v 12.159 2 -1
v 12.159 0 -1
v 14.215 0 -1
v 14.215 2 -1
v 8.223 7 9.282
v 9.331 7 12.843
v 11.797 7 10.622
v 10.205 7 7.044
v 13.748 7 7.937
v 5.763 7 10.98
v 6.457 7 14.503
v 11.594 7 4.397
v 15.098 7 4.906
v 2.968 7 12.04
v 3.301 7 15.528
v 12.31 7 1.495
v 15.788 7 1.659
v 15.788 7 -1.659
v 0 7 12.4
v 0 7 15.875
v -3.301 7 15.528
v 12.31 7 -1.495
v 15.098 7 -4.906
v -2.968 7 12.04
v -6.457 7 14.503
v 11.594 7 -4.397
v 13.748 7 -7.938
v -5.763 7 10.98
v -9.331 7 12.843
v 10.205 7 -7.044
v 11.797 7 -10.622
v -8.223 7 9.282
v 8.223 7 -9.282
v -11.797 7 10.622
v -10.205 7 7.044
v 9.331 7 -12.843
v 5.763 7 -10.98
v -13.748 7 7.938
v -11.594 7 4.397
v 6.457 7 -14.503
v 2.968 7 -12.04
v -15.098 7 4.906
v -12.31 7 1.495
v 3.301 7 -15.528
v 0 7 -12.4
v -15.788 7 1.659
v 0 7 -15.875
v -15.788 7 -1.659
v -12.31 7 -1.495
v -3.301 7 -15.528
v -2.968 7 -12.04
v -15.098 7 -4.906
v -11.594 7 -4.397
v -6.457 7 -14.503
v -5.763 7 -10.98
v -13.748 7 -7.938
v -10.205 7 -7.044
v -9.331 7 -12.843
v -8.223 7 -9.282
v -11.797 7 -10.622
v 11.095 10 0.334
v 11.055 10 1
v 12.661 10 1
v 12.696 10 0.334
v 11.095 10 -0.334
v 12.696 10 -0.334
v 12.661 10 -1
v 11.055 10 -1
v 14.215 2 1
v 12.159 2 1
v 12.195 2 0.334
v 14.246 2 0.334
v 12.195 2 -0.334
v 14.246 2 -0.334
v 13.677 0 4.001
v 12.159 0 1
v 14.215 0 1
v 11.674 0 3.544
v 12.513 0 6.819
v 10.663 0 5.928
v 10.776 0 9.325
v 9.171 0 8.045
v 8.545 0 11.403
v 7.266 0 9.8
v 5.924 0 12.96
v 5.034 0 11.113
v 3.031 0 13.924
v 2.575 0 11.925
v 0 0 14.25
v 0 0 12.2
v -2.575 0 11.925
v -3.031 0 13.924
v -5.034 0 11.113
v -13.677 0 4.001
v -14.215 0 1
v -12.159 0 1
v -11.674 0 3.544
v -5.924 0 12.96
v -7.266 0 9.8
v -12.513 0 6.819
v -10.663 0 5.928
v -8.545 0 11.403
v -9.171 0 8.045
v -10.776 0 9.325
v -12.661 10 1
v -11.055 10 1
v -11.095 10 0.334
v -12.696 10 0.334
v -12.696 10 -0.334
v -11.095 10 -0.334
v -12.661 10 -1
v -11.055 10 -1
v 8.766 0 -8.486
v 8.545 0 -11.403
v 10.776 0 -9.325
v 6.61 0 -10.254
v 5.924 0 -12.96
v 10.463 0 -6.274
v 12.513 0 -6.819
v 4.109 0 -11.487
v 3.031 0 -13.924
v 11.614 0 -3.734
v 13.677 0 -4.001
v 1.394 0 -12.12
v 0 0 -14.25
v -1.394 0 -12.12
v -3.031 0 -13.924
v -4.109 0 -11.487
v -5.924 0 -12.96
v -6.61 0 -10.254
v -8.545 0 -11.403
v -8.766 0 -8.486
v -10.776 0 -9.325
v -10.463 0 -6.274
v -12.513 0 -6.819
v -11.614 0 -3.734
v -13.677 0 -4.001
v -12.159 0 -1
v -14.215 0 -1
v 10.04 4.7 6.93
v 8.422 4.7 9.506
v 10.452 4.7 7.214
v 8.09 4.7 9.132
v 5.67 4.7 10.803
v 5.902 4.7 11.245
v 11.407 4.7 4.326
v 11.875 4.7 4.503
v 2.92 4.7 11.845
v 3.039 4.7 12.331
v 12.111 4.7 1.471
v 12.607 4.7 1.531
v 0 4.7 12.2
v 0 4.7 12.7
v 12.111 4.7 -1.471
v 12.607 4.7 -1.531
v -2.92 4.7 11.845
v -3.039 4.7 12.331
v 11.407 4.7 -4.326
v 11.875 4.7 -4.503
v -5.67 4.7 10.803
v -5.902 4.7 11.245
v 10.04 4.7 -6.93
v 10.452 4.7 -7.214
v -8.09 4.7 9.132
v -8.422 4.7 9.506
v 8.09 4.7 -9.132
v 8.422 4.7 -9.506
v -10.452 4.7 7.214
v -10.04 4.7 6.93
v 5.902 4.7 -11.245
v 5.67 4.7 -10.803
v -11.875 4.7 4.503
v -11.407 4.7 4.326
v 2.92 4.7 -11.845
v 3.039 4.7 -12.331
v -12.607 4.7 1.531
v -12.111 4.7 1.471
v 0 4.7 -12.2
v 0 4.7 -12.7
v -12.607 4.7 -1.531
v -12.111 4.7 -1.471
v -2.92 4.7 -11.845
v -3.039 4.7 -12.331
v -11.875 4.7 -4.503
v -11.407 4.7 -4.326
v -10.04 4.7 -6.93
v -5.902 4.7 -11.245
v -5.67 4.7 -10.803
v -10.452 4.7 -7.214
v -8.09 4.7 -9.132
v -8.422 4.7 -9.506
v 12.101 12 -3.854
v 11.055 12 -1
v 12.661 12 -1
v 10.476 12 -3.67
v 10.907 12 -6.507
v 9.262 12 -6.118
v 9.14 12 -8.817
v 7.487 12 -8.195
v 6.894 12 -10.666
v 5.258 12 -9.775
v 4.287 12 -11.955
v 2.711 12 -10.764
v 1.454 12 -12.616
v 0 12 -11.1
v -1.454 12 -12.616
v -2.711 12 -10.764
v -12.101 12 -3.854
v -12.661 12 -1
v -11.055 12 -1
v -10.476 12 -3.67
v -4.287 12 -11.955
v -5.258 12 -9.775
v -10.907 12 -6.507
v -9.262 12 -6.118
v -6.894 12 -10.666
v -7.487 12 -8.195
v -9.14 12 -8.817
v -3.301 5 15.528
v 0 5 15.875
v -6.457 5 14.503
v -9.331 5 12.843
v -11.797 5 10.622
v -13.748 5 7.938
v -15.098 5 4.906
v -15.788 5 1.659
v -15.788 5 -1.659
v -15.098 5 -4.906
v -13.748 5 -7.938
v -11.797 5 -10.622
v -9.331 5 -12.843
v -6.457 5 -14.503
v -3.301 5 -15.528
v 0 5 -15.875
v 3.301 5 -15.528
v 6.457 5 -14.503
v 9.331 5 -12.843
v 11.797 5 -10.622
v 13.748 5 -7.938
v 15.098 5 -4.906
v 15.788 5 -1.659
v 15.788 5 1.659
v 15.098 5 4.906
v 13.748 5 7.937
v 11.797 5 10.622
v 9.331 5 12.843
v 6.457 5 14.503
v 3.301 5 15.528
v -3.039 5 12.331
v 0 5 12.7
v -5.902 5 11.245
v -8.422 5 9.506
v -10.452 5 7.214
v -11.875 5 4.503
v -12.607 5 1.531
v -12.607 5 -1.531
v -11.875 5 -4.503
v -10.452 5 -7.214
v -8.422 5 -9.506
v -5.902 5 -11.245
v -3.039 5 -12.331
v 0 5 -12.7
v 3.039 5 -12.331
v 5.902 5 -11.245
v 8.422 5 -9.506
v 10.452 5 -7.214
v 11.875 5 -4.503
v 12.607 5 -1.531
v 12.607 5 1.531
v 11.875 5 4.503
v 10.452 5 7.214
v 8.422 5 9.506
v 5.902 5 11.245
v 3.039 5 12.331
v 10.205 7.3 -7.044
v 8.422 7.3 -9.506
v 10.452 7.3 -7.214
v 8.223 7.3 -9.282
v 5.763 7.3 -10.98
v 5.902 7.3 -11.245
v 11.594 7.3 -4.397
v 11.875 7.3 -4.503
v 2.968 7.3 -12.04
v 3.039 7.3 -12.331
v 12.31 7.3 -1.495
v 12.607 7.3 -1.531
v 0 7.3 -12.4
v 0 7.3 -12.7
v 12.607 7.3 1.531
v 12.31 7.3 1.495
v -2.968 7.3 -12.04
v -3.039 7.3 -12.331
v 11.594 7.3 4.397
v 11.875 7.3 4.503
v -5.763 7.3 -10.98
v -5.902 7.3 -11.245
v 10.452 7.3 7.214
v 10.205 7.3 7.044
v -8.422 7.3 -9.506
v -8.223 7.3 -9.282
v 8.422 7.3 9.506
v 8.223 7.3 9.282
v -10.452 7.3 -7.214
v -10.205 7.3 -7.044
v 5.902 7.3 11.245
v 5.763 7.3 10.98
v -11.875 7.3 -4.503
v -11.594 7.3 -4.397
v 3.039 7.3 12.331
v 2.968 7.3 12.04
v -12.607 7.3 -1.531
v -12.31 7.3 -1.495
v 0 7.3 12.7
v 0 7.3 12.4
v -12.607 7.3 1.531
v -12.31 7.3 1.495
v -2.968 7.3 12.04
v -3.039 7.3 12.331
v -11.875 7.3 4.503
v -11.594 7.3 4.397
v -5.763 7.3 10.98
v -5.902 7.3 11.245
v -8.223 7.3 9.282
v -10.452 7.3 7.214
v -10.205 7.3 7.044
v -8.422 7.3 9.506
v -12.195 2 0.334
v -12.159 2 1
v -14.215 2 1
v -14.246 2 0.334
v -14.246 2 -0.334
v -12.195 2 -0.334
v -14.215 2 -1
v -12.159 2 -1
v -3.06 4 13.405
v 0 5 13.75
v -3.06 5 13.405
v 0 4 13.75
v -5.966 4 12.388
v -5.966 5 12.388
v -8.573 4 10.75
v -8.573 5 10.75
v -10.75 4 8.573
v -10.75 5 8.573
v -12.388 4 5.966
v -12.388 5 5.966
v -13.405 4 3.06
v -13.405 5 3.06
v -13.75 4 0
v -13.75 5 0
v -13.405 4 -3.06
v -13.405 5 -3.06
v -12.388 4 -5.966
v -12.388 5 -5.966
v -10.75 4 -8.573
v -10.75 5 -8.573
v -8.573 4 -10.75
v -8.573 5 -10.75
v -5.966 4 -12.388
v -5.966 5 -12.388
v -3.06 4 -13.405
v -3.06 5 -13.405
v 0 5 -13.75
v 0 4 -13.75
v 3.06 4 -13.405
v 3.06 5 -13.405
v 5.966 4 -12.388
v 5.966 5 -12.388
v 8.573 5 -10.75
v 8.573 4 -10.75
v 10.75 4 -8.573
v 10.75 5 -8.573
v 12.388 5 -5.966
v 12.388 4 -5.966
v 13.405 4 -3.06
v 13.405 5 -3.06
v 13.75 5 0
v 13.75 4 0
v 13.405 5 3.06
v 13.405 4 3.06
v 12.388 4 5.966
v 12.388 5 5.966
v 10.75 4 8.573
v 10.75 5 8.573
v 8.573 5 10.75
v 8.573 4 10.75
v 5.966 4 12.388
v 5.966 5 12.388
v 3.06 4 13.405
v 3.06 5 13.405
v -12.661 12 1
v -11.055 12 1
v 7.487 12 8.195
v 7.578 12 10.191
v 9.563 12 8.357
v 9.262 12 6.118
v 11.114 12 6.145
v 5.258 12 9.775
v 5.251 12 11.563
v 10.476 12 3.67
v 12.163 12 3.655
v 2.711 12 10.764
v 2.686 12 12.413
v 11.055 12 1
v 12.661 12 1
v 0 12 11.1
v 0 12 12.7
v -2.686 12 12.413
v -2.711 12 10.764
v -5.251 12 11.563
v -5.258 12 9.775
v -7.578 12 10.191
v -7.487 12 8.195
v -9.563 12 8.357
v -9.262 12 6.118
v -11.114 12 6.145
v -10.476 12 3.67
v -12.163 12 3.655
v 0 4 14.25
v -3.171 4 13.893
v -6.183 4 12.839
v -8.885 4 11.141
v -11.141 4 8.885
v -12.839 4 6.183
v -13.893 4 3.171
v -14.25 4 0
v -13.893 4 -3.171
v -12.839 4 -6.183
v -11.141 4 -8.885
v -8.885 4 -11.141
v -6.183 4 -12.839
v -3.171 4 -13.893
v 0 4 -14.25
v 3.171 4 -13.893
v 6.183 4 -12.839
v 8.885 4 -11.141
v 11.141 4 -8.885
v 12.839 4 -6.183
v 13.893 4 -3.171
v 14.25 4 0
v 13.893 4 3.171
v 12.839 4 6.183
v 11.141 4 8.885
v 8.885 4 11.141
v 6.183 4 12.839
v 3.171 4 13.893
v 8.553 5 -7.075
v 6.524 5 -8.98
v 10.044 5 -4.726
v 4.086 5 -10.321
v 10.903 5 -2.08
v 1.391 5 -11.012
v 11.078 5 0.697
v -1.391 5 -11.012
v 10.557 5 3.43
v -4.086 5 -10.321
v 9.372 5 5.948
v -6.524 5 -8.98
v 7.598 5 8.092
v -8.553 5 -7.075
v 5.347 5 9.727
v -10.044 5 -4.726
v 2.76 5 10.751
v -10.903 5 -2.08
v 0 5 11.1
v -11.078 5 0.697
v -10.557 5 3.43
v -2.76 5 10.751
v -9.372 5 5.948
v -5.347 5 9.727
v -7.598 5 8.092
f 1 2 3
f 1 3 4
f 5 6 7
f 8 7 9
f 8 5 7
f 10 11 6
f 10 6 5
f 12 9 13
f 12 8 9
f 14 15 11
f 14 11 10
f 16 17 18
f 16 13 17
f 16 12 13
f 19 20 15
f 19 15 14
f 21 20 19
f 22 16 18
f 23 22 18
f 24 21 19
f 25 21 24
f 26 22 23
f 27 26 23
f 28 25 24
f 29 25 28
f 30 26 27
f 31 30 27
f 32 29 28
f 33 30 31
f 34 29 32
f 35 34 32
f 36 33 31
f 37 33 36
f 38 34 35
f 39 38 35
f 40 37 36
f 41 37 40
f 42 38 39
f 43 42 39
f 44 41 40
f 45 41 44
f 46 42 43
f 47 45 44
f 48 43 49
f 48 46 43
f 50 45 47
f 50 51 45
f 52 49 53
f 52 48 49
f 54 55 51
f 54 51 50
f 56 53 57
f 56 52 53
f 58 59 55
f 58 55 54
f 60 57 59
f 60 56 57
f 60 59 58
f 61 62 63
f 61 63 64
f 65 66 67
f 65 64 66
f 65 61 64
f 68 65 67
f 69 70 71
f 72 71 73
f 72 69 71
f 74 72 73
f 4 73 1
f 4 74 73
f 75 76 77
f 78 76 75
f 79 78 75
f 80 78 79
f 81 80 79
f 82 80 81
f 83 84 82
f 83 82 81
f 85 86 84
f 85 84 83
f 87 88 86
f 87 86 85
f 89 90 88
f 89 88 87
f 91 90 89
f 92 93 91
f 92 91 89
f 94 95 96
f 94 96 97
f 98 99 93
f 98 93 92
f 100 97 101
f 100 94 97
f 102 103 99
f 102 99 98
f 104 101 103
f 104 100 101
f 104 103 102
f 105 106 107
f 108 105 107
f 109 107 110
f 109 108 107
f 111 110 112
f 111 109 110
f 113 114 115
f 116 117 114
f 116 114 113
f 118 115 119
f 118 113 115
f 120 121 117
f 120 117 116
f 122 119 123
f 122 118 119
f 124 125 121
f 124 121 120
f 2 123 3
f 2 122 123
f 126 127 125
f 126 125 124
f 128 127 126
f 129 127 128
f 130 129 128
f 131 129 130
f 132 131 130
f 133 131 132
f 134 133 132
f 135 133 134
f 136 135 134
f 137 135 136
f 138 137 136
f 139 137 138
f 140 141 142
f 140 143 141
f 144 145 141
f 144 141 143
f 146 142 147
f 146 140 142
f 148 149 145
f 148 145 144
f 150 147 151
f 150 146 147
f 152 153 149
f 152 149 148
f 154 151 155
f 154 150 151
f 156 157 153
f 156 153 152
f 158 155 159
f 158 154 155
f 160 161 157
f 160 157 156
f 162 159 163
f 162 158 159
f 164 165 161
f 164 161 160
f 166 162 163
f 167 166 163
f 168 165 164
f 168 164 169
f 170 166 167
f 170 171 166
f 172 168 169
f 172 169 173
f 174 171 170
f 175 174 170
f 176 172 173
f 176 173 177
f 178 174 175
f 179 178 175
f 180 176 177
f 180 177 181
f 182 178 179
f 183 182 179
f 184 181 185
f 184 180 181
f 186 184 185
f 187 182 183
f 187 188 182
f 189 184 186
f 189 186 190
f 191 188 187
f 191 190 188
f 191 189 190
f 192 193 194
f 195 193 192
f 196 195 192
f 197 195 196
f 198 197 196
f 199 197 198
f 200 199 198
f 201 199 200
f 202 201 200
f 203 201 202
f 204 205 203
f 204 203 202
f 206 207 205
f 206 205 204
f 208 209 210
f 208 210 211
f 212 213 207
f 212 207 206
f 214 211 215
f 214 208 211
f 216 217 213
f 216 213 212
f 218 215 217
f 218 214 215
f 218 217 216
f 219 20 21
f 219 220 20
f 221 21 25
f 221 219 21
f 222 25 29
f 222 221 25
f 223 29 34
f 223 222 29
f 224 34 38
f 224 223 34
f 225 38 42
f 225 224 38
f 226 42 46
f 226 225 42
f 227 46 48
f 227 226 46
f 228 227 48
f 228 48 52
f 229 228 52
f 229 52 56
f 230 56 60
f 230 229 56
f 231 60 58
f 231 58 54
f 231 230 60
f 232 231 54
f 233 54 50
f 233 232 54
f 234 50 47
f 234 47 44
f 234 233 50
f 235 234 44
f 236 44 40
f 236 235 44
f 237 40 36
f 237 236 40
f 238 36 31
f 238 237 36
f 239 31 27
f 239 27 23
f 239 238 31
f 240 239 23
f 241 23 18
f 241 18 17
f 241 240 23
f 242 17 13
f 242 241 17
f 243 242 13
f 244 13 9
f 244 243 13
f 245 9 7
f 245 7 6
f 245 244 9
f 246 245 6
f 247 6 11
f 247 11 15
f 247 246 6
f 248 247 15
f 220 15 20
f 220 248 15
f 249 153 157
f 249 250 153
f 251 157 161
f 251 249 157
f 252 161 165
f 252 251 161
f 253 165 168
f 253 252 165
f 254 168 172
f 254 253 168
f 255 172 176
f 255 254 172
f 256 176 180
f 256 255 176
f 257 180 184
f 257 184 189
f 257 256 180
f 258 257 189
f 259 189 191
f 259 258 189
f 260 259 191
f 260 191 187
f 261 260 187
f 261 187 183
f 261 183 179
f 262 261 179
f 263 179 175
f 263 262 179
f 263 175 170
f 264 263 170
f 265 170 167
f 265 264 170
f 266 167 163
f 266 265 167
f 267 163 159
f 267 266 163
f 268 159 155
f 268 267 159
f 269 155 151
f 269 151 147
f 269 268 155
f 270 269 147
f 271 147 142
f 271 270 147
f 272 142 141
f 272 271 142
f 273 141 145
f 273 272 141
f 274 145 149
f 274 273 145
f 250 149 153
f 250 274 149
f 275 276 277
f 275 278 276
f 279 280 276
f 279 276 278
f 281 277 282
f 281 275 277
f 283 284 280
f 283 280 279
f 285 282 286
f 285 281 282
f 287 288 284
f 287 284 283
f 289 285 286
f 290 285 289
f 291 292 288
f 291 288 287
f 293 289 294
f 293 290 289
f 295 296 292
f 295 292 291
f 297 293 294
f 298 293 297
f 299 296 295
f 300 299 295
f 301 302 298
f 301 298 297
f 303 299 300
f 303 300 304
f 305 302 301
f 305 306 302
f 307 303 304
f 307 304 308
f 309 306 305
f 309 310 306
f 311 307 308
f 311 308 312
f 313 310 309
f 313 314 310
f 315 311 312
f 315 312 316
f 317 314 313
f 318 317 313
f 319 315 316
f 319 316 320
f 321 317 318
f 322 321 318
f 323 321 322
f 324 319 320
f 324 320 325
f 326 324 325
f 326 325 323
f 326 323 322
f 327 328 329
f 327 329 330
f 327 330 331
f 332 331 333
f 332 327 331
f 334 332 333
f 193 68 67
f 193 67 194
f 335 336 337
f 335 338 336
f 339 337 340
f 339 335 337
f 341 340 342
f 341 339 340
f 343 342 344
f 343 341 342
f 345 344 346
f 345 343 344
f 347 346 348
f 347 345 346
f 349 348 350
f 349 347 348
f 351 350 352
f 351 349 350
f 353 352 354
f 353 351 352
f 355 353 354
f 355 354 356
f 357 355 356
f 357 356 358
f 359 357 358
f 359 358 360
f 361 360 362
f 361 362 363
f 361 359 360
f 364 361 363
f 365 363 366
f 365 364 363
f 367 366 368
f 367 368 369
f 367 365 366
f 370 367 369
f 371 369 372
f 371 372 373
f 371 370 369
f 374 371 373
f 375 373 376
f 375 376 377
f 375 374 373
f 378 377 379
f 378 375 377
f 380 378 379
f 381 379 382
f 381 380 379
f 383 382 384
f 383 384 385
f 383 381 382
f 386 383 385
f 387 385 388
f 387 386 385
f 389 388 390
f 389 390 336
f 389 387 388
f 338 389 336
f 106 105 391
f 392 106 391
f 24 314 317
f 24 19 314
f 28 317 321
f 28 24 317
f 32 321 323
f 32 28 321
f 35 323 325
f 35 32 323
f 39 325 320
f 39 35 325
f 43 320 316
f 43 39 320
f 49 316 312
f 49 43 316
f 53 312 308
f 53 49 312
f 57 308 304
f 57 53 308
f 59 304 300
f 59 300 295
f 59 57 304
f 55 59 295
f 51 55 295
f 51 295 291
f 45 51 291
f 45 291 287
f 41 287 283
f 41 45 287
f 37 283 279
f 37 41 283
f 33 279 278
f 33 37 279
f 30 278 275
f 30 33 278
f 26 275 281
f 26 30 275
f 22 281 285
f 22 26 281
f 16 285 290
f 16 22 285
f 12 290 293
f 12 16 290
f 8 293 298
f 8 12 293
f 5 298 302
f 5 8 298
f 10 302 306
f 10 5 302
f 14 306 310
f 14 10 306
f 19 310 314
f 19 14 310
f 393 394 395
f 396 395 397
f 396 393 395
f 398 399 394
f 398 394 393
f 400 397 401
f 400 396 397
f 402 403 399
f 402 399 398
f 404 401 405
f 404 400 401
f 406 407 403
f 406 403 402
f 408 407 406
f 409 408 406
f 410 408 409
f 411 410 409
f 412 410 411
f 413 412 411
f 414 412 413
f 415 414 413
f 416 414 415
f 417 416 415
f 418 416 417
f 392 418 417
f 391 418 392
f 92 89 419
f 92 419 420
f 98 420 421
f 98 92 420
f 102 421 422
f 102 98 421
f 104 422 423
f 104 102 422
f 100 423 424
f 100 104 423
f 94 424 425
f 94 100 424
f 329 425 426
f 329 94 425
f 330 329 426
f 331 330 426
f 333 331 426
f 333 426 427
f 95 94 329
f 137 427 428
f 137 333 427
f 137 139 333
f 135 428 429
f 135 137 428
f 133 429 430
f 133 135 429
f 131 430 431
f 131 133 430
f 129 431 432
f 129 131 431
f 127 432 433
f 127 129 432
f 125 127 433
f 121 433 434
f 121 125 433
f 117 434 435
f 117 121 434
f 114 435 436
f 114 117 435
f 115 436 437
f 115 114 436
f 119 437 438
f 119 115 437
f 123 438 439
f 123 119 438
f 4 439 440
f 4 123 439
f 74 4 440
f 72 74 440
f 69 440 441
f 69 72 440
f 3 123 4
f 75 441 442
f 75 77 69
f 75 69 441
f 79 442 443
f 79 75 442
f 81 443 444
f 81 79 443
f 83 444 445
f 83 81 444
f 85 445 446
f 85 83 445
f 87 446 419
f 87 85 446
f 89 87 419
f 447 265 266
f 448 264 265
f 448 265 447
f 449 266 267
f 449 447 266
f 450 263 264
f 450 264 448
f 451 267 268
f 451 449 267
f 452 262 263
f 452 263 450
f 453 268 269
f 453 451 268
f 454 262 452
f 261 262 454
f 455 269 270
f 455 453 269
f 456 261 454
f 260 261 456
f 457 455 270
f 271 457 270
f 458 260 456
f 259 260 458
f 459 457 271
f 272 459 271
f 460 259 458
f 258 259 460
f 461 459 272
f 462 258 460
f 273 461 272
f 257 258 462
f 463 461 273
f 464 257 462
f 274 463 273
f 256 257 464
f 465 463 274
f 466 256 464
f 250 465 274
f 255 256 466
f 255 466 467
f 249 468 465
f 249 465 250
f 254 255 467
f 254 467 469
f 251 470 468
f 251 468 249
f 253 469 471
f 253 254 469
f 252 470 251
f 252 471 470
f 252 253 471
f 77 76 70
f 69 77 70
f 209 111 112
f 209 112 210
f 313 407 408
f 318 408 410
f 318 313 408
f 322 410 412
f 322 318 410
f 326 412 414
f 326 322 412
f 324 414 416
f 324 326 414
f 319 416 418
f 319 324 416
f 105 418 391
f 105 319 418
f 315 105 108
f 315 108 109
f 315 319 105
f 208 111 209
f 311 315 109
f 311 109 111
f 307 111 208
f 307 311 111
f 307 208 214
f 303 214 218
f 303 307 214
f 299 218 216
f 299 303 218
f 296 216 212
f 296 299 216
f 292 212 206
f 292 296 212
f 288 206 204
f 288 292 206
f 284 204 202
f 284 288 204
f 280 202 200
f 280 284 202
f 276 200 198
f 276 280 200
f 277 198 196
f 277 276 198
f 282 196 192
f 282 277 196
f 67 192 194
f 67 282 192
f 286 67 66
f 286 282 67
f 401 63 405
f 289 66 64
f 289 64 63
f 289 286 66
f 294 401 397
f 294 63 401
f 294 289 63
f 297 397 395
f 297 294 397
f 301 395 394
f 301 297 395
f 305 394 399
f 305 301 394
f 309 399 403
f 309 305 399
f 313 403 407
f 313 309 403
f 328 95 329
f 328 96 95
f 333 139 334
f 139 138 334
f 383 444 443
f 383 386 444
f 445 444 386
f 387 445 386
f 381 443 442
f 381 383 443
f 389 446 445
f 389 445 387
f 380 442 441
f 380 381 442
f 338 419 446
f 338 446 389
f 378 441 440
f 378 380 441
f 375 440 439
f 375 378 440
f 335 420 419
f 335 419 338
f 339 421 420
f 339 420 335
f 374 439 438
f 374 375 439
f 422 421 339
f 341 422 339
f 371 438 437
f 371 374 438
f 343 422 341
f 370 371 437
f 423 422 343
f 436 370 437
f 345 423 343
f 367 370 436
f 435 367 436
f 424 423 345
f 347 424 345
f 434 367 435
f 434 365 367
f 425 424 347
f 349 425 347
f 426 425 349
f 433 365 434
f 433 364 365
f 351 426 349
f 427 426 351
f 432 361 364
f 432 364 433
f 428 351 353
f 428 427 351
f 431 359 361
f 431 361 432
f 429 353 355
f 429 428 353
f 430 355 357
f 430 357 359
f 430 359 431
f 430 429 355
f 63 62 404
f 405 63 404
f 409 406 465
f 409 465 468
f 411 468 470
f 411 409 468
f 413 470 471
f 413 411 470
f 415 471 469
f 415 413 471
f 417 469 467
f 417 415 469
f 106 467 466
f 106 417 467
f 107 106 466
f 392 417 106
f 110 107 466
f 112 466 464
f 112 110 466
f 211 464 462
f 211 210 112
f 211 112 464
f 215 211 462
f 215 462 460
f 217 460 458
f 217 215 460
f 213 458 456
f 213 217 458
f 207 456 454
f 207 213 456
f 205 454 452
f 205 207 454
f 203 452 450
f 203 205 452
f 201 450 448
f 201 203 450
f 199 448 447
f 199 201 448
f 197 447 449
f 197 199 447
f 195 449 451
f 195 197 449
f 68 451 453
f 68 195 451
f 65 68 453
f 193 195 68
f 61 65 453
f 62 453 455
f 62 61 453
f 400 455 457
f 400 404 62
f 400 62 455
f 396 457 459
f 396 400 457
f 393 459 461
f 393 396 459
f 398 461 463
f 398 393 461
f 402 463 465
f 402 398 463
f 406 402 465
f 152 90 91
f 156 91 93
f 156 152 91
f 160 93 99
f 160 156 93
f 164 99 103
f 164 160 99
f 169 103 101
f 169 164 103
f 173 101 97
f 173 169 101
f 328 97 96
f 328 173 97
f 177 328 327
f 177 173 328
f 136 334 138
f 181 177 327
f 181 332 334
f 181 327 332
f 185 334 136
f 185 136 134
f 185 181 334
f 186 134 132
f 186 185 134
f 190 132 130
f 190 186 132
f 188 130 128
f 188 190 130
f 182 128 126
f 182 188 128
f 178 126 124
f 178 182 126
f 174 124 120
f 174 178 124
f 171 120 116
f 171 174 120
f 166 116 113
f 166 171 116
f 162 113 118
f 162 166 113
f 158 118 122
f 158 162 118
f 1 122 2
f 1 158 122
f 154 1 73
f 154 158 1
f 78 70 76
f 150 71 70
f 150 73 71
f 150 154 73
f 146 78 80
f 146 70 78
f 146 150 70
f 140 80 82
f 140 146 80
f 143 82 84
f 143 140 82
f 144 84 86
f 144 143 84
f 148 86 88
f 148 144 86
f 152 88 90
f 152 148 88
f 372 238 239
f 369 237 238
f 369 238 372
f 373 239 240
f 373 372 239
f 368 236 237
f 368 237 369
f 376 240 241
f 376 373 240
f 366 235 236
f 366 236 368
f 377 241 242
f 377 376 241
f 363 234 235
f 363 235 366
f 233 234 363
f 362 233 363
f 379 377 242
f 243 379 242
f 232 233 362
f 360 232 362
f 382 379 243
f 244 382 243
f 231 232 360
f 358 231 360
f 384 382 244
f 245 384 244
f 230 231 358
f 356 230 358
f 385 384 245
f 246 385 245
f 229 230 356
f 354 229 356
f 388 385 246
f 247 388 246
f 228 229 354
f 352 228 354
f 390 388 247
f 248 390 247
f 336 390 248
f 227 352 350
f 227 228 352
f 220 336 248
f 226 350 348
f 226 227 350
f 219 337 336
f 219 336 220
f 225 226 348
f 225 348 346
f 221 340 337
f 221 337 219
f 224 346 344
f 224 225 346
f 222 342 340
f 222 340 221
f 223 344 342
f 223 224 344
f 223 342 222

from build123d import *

# Parameters (mm, degrees)
SKETCH_2_W          = 2
SKETCH_2_H          = 3.593987872
SKETCH_2_H_2        = 6.667892238
CUT_EXTRUDE_1_DEPTH = 39.5


with BuildPart() as part:
    # 草图1 → 旋转1 (revolve)
    with BuildSketch(Plane.XY, mode=Mode.PRIVATE) as revolve_1_sk:
        Polygon((-11.1, 12), (-12.7, 12), (-12.7, 7.3), (-12.4, 7.3), (-12.4, 7), (-15.875, 7), (-15.875, 5), (-13.75, 5), (-13.75, 4), (-14.25, 4), (-14.25, 0), (-12.2, 0), (-12.2, 4.7), (-12.7, 4.7), (-12.7, 5), (-11.1, 5), align=None)
    revolve(revolve_1_sk.sketch.rotate(Axis((0, 22.677499451, 0), (0, -1, 0)), 270), axis=Axis((0, 22.677499451, 0), (0, -1, 0)))  # turned: the seam where the file's is

    # 草图2 → 切除-拉伸1 (cut, symmetric)
    with BuildSketch(Plane(origin=(0, 0, 0), x_dir=(0, 0, -1), z_dir=(1, 0, 0))):
        with Locations((0, 11.796993936)):
            Rectangle(SKETCH_2_W, SKETCH_2_H)
        with Locations((0, -1.333946119)):
            Rectangle(SKETCH_2_W, SKETCH_2_H_2)
    extrude(amount=CUT_EXTRUDE_1_DEPTH, both=True, mode=Mode.SUBTRACT)


solid = part.part
